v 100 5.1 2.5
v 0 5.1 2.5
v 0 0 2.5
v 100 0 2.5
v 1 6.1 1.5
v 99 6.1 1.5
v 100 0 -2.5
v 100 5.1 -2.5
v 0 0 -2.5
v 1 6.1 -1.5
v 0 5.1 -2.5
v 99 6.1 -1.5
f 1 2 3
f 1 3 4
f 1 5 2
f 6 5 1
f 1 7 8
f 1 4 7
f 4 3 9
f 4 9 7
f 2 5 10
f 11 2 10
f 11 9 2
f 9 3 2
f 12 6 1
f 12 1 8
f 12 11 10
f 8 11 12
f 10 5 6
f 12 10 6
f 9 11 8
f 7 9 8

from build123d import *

# Parameters (mm, degrees)
SKETCH_1_W      = 100
SKETCH_1_H      = 6.1
EXTRUDE_1_DEPTH = 2.5
CHAMFER_1_SIZE  = 1


with BuildPart() as part:
    # 스케치1 → 보스-돌출1 (new, symmetric)
    with BuildSketch(Plane.XY):
        with Locations((50, 3.05)):
            Rectangle(SKETCH_1_W, SKETCH_1_H)
    extrude(amount=EXTRUDE_1_DEPTH, both=True)

    # 모따기1
    chamfer_1_edges = [part.edges().sort_by_distance(p)[0] for p in [
        (50, 6.1, 2.5),
        (50, 6.1, -2.5),
        (0, 6.1, 0),
        (100, 6.1, 0),
    ]]
    chamfer(chamfer_1_edges, length=CHAMFER_1_SIZE)


solid = part.part
